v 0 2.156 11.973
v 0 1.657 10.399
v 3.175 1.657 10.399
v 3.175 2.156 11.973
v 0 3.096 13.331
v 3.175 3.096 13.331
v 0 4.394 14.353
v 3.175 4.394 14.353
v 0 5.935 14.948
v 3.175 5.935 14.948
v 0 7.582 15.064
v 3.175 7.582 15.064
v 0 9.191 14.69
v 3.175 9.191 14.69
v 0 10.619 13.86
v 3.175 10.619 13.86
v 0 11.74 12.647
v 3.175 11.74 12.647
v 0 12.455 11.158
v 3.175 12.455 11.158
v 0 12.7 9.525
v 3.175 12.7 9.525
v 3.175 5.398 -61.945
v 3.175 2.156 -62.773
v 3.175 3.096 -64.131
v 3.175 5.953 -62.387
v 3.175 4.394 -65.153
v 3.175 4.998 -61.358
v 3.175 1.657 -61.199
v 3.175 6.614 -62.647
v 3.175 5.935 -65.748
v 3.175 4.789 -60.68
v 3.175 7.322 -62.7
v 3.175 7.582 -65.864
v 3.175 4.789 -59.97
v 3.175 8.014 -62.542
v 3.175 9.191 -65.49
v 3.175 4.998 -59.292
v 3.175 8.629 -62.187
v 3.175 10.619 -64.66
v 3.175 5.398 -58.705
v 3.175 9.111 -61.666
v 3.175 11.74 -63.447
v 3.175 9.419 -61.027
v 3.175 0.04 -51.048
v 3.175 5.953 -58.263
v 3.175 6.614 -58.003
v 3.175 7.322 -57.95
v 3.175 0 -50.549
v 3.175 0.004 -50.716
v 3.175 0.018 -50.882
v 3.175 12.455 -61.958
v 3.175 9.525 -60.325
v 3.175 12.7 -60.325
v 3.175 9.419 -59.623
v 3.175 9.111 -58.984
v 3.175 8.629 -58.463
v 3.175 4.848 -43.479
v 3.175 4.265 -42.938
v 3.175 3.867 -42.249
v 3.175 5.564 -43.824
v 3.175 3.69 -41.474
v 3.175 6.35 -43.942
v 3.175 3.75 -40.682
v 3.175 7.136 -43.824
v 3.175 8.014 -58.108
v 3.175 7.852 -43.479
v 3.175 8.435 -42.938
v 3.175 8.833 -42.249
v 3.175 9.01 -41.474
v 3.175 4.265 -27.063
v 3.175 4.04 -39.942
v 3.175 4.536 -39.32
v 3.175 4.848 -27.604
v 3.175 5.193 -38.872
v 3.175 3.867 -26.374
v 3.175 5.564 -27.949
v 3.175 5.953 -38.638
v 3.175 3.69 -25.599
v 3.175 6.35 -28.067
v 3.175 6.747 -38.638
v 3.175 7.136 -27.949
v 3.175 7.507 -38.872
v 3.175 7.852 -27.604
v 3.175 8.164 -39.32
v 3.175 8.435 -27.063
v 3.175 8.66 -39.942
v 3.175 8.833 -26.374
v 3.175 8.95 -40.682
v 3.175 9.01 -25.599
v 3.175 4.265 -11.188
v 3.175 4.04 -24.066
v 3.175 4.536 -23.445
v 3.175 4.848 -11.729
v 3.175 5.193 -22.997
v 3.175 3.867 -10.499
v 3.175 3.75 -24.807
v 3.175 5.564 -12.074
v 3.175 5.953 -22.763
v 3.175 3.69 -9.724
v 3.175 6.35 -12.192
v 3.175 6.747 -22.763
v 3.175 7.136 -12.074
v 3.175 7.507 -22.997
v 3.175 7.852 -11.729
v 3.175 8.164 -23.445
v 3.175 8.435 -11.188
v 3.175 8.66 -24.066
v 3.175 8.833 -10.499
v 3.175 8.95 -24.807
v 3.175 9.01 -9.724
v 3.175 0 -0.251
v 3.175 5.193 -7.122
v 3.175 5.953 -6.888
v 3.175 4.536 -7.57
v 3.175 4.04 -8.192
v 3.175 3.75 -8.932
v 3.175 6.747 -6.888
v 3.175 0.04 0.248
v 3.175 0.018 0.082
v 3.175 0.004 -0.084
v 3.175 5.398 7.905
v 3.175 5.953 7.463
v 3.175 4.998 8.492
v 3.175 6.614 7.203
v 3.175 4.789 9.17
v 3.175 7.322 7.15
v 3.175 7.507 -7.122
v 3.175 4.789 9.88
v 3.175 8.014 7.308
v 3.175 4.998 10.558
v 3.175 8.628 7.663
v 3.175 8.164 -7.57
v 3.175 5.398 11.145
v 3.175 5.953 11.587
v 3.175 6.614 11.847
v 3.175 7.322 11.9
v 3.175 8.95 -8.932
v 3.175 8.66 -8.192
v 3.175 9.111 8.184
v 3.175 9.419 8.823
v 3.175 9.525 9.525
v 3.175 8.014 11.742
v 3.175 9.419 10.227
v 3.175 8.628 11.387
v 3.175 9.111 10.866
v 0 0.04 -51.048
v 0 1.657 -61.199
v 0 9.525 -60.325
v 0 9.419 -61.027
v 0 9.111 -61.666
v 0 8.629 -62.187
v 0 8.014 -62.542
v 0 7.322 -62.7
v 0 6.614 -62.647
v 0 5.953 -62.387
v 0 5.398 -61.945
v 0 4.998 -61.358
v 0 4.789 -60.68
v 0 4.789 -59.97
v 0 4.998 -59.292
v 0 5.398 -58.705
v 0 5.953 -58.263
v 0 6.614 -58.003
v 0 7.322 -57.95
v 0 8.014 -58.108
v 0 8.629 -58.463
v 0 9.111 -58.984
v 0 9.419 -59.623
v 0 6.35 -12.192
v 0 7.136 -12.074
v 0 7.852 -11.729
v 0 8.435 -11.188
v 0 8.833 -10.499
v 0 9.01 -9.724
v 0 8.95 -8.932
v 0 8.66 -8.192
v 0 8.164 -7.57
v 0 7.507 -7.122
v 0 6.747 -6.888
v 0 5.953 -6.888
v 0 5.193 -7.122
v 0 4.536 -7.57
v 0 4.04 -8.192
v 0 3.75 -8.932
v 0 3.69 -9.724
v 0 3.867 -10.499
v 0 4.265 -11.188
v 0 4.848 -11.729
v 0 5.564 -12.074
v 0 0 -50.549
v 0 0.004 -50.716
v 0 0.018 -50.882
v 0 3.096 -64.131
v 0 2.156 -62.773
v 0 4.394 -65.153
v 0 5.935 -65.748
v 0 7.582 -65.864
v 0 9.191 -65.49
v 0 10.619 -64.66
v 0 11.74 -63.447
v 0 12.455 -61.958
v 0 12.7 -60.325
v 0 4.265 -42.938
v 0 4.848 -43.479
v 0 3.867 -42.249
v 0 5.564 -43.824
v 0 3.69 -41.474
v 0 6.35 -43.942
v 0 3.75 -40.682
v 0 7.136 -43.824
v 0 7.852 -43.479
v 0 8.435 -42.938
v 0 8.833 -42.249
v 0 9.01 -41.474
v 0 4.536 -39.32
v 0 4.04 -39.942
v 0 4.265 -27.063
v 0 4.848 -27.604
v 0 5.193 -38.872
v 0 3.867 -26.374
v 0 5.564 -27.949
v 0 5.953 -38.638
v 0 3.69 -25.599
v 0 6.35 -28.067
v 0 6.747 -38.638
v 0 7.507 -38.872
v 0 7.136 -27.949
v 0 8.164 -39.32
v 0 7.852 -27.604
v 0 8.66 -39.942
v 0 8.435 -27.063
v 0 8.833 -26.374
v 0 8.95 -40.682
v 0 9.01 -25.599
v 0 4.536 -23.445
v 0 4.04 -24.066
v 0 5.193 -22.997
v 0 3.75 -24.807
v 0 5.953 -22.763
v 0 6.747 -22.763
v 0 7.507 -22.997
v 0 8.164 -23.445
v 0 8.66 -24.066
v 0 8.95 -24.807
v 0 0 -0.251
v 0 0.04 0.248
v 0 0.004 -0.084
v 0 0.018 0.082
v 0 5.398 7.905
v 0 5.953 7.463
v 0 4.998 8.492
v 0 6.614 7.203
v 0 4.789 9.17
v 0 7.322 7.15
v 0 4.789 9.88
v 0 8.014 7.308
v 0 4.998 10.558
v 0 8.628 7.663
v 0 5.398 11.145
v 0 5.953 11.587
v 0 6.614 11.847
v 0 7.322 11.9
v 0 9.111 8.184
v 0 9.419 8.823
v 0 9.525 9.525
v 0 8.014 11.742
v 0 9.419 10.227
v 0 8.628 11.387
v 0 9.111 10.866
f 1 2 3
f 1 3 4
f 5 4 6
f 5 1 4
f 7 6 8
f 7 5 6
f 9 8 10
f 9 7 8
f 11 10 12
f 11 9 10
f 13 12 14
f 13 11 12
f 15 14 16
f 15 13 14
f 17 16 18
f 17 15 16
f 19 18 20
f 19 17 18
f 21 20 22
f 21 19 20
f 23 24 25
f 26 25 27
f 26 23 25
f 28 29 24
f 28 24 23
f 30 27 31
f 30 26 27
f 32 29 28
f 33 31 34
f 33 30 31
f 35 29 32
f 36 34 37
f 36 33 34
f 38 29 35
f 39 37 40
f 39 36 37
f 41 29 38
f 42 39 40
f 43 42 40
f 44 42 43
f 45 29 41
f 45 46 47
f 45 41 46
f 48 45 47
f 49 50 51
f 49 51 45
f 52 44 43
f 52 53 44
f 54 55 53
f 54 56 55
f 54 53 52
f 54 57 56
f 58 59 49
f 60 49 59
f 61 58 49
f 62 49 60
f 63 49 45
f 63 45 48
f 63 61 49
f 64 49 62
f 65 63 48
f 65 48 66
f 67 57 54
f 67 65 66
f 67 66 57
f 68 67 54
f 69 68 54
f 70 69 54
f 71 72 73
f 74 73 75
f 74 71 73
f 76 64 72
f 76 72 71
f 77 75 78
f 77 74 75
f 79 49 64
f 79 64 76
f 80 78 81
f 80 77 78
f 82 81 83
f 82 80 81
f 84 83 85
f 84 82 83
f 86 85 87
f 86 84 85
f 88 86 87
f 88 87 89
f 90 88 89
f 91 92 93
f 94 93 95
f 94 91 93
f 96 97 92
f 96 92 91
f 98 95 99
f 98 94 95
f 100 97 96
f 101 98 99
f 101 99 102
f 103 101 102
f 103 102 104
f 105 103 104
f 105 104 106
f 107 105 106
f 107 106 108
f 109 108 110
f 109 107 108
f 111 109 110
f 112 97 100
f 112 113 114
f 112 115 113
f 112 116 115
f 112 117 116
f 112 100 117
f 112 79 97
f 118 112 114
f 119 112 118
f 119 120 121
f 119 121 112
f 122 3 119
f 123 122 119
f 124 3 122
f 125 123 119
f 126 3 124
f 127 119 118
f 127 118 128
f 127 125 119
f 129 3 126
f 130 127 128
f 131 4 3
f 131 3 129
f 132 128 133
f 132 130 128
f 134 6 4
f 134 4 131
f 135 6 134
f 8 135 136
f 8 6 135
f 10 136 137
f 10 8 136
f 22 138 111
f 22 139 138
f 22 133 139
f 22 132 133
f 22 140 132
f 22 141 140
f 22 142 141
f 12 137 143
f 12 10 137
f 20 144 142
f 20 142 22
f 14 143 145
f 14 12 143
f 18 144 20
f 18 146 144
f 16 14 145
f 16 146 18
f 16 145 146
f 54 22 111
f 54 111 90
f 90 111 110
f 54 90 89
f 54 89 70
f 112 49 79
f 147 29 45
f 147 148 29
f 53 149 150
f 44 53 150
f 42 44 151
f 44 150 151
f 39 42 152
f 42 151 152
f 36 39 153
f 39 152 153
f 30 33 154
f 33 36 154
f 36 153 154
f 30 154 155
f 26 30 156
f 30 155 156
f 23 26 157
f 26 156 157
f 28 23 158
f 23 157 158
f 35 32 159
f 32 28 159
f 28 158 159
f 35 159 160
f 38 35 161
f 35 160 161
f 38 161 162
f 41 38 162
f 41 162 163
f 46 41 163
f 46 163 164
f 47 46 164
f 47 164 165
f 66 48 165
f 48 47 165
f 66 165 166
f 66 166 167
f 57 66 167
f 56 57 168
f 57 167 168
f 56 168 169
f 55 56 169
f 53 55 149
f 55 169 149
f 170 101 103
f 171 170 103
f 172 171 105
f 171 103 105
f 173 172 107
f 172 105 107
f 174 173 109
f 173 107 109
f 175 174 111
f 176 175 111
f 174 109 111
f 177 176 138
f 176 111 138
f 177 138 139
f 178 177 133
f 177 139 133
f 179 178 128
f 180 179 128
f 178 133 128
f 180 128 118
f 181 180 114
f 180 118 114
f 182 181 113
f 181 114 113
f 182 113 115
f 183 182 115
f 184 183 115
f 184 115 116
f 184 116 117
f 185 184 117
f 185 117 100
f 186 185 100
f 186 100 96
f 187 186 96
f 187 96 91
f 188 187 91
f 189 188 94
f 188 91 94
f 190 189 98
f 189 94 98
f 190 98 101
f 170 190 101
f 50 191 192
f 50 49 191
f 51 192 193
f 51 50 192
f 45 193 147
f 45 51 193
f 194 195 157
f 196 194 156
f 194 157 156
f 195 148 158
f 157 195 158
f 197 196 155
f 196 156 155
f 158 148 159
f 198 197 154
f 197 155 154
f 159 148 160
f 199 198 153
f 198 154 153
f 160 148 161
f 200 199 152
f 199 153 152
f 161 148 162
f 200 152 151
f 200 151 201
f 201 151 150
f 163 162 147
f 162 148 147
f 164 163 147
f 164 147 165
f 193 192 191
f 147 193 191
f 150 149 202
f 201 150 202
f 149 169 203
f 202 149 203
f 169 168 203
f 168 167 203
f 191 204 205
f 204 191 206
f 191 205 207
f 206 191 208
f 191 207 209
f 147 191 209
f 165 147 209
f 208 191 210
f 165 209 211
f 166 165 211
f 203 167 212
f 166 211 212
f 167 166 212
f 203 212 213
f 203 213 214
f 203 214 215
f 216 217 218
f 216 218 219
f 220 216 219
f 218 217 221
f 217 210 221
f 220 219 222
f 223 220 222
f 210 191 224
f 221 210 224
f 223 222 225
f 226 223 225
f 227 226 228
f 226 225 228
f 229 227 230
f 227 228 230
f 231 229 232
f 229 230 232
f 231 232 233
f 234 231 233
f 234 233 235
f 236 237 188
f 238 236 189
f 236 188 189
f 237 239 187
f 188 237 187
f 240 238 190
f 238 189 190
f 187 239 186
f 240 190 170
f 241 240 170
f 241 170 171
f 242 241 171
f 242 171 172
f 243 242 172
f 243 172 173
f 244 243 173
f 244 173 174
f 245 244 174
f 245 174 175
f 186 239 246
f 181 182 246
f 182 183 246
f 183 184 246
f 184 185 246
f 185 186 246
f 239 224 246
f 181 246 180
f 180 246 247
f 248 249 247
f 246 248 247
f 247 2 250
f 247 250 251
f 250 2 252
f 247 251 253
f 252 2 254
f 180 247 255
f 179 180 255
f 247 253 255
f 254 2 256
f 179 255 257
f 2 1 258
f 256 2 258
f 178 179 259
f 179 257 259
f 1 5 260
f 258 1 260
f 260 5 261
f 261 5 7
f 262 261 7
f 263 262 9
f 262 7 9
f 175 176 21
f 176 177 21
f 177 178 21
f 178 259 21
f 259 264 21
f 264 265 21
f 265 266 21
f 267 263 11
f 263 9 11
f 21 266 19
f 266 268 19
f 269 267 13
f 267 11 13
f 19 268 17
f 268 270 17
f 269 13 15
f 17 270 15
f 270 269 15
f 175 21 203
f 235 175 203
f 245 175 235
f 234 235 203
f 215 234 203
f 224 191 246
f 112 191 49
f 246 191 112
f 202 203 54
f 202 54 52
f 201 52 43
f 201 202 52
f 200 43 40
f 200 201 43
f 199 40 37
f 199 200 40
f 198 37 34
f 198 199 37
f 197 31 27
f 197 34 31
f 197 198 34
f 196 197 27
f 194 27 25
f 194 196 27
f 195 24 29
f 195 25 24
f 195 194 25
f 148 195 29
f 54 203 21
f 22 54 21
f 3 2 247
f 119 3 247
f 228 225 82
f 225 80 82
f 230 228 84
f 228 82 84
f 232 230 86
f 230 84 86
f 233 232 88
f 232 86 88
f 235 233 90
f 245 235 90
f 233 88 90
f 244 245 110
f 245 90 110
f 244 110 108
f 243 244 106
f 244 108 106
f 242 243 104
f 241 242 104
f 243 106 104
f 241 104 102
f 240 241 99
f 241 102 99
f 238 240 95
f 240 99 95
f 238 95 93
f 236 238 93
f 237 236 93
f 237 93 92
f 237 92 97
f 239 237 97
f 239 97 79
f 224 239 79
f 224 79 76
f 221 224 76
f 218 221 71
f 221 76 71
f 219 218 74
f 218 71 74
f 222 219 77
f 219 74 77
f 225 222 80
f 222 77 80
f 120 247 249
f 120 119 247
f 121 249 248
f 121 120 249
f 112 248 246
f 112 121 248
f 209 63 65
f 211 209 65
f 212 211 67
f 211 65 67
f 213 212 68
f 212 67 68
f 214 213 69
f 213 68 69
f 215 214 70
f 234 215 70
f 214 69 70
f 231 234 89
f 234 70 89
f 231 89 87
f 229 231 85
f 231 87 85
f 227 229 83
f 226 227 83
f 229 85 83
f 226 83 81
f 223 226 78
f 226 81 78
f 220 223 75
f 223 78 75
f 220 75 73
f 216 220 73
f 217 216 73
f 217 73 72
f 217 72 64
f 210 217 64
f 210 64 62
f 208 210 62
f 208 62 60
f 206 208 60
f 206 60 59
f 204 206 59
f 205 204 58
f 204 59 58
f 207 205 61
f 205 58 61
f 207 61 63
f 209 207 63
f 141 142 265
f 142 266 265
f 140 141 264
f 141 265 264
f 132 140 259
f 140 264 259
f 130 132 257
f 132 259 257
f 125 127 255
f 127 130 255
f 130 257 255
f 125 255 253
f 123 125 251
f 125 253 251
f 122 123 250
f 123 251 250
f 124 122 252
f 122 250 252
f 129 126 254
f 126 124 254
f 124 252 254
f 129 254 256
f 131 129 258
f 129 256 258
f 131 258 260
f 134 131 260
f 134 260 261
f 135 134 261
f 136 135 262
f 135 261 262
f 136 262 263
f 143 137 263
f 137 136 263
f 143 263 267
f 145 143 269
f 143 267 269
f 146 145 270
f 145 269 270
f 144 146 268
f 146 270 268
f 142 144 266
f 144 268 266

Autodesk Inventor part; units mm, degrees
ref_plane "YZ Plane" through (0, 0, 0) normal (1, 0, 0) x (0, 1, 0)
ref_plane "XZ Plane" through (0, 0, 0) normal (0, 1, 0) x (-1, 0, 0)
ref_plane "XY Plane" through (0, 0, 0) normal (0, 0, 1) x (1, 0, 0)
sketch "Sketch1" plane through (0, 0, 0) normal (1, 0, 0) x (0, 1, 0)
  line L0 (0, 0) -> (12.7, 0)
  line L1 (12.7, 0) -> (12.7, -50.8)
  line L2 (12.7, -50.8) -> (0, -50.8)
  line L3 (0, -50.8) -> (0, 0)
  arc A0 (12.7, 9.525) -> (1.6567, 10.3991) centre (7.1437, 9.525) ccw
  line L4 (12.7, 0) -> (12.7, 9.525)
  line L5 (1.6567, 10.3991) -> (0, 0)
  line L6 (7.1437, 9.525) -> (7.1437, 0) construction
  circle A1 centre (7.1437, 9.525) radius 6.35 construction
  line L7 (12.7, -25.4) -> (0, -25.4) construction
  arc A2 (1.6567, -61.1991) -> (12.7, -60.325) centre (7.1438, -60.325) ccw
  line L8 (12.7, -50.8) -> (12.7, -60.325)
  line L9 (1.6567, -61.1991) -> (0, -50.8)
  circle A3 centre (7.1437, 9.525) radius 2.3813
  circle A4 centre (7.1438, -60.325) radius 2.3813
  dimension "d0" = 12.7
  dimension "d1" = 50.8
  dimension "d7" = 12.7
  dimension "d8" = 9.525
  dimension "d11" = 4.7625
  dimension "d25" = 3.175
extrude "Extrusion1" add sketch "Sketch1" along normal blind 3.175
sketch "Sketch2" plane through (3.175, 0, 0) normal (1, 0, 0) x (0, 0, -1)
  line L0 (60.325, 12.7) -> (-9.525, 12.7) projected
  line L1 (25.4, 12.7) -> (25.4, 0) construction
  line L2 (0, 0) -> (50.8, 0) projected
  line L3 (0, 12.7) -> (50.8, 12.7) construction
  line L4 (50.8, 12.7) -> (50.8, 38.1) construction
  line L5 (50.8, 38.1) -> (0, 38.1) construction
  line L6 (0, 38.1) -> (0, 12.7) construction
  line L7 (3.175, 34.925) -> (47.625, 34.925) construction
  line L8 (47.625, 34.925) -> (47.625, 15.875) construction
  line L9 (47.625, 15.875) -> (3.175, 15.875) construction
  line L10 (3.175, 15.875) -> (3.175, 34.925) construction
  circle A0 centre (9.525, 6.35) radius 2.667
  line L11 (25.4, 6.35) -> (44.9012, 6.35) construction
  circle A1 centre (25.4, 6.35) radius 2.667
  line L12 (9.525, 6.35) -> (32.9122, 6.35) construction
  circle A2 centre (41.275, 6.35) radius 2.667
  circle A3 centre (9.525, 6.35) radius 2.667
  circle A4 centre (25.4, 6.35) radius 2.667
  circle A5 centre (41.275, 6.35) radius 2.667
  dimension "d16" = 50.8
  dimension "d17" = 25.4
  dimension "d18" = 3.175
  dimension "d19" = 5.334
  dimension "d20" = 15.875
  dimension "d21" = 6.35
  dimension "d22" = 5.334
extrude "Extrusion2" cut sketch "Sketch2" against normal through all
fillet "Fillet1" radius 3.175 2 edges at (1.5875, 0, 0) (1.5875, 0, -50.8)
properties part number "ElevatorCarriageBearingGusset"
